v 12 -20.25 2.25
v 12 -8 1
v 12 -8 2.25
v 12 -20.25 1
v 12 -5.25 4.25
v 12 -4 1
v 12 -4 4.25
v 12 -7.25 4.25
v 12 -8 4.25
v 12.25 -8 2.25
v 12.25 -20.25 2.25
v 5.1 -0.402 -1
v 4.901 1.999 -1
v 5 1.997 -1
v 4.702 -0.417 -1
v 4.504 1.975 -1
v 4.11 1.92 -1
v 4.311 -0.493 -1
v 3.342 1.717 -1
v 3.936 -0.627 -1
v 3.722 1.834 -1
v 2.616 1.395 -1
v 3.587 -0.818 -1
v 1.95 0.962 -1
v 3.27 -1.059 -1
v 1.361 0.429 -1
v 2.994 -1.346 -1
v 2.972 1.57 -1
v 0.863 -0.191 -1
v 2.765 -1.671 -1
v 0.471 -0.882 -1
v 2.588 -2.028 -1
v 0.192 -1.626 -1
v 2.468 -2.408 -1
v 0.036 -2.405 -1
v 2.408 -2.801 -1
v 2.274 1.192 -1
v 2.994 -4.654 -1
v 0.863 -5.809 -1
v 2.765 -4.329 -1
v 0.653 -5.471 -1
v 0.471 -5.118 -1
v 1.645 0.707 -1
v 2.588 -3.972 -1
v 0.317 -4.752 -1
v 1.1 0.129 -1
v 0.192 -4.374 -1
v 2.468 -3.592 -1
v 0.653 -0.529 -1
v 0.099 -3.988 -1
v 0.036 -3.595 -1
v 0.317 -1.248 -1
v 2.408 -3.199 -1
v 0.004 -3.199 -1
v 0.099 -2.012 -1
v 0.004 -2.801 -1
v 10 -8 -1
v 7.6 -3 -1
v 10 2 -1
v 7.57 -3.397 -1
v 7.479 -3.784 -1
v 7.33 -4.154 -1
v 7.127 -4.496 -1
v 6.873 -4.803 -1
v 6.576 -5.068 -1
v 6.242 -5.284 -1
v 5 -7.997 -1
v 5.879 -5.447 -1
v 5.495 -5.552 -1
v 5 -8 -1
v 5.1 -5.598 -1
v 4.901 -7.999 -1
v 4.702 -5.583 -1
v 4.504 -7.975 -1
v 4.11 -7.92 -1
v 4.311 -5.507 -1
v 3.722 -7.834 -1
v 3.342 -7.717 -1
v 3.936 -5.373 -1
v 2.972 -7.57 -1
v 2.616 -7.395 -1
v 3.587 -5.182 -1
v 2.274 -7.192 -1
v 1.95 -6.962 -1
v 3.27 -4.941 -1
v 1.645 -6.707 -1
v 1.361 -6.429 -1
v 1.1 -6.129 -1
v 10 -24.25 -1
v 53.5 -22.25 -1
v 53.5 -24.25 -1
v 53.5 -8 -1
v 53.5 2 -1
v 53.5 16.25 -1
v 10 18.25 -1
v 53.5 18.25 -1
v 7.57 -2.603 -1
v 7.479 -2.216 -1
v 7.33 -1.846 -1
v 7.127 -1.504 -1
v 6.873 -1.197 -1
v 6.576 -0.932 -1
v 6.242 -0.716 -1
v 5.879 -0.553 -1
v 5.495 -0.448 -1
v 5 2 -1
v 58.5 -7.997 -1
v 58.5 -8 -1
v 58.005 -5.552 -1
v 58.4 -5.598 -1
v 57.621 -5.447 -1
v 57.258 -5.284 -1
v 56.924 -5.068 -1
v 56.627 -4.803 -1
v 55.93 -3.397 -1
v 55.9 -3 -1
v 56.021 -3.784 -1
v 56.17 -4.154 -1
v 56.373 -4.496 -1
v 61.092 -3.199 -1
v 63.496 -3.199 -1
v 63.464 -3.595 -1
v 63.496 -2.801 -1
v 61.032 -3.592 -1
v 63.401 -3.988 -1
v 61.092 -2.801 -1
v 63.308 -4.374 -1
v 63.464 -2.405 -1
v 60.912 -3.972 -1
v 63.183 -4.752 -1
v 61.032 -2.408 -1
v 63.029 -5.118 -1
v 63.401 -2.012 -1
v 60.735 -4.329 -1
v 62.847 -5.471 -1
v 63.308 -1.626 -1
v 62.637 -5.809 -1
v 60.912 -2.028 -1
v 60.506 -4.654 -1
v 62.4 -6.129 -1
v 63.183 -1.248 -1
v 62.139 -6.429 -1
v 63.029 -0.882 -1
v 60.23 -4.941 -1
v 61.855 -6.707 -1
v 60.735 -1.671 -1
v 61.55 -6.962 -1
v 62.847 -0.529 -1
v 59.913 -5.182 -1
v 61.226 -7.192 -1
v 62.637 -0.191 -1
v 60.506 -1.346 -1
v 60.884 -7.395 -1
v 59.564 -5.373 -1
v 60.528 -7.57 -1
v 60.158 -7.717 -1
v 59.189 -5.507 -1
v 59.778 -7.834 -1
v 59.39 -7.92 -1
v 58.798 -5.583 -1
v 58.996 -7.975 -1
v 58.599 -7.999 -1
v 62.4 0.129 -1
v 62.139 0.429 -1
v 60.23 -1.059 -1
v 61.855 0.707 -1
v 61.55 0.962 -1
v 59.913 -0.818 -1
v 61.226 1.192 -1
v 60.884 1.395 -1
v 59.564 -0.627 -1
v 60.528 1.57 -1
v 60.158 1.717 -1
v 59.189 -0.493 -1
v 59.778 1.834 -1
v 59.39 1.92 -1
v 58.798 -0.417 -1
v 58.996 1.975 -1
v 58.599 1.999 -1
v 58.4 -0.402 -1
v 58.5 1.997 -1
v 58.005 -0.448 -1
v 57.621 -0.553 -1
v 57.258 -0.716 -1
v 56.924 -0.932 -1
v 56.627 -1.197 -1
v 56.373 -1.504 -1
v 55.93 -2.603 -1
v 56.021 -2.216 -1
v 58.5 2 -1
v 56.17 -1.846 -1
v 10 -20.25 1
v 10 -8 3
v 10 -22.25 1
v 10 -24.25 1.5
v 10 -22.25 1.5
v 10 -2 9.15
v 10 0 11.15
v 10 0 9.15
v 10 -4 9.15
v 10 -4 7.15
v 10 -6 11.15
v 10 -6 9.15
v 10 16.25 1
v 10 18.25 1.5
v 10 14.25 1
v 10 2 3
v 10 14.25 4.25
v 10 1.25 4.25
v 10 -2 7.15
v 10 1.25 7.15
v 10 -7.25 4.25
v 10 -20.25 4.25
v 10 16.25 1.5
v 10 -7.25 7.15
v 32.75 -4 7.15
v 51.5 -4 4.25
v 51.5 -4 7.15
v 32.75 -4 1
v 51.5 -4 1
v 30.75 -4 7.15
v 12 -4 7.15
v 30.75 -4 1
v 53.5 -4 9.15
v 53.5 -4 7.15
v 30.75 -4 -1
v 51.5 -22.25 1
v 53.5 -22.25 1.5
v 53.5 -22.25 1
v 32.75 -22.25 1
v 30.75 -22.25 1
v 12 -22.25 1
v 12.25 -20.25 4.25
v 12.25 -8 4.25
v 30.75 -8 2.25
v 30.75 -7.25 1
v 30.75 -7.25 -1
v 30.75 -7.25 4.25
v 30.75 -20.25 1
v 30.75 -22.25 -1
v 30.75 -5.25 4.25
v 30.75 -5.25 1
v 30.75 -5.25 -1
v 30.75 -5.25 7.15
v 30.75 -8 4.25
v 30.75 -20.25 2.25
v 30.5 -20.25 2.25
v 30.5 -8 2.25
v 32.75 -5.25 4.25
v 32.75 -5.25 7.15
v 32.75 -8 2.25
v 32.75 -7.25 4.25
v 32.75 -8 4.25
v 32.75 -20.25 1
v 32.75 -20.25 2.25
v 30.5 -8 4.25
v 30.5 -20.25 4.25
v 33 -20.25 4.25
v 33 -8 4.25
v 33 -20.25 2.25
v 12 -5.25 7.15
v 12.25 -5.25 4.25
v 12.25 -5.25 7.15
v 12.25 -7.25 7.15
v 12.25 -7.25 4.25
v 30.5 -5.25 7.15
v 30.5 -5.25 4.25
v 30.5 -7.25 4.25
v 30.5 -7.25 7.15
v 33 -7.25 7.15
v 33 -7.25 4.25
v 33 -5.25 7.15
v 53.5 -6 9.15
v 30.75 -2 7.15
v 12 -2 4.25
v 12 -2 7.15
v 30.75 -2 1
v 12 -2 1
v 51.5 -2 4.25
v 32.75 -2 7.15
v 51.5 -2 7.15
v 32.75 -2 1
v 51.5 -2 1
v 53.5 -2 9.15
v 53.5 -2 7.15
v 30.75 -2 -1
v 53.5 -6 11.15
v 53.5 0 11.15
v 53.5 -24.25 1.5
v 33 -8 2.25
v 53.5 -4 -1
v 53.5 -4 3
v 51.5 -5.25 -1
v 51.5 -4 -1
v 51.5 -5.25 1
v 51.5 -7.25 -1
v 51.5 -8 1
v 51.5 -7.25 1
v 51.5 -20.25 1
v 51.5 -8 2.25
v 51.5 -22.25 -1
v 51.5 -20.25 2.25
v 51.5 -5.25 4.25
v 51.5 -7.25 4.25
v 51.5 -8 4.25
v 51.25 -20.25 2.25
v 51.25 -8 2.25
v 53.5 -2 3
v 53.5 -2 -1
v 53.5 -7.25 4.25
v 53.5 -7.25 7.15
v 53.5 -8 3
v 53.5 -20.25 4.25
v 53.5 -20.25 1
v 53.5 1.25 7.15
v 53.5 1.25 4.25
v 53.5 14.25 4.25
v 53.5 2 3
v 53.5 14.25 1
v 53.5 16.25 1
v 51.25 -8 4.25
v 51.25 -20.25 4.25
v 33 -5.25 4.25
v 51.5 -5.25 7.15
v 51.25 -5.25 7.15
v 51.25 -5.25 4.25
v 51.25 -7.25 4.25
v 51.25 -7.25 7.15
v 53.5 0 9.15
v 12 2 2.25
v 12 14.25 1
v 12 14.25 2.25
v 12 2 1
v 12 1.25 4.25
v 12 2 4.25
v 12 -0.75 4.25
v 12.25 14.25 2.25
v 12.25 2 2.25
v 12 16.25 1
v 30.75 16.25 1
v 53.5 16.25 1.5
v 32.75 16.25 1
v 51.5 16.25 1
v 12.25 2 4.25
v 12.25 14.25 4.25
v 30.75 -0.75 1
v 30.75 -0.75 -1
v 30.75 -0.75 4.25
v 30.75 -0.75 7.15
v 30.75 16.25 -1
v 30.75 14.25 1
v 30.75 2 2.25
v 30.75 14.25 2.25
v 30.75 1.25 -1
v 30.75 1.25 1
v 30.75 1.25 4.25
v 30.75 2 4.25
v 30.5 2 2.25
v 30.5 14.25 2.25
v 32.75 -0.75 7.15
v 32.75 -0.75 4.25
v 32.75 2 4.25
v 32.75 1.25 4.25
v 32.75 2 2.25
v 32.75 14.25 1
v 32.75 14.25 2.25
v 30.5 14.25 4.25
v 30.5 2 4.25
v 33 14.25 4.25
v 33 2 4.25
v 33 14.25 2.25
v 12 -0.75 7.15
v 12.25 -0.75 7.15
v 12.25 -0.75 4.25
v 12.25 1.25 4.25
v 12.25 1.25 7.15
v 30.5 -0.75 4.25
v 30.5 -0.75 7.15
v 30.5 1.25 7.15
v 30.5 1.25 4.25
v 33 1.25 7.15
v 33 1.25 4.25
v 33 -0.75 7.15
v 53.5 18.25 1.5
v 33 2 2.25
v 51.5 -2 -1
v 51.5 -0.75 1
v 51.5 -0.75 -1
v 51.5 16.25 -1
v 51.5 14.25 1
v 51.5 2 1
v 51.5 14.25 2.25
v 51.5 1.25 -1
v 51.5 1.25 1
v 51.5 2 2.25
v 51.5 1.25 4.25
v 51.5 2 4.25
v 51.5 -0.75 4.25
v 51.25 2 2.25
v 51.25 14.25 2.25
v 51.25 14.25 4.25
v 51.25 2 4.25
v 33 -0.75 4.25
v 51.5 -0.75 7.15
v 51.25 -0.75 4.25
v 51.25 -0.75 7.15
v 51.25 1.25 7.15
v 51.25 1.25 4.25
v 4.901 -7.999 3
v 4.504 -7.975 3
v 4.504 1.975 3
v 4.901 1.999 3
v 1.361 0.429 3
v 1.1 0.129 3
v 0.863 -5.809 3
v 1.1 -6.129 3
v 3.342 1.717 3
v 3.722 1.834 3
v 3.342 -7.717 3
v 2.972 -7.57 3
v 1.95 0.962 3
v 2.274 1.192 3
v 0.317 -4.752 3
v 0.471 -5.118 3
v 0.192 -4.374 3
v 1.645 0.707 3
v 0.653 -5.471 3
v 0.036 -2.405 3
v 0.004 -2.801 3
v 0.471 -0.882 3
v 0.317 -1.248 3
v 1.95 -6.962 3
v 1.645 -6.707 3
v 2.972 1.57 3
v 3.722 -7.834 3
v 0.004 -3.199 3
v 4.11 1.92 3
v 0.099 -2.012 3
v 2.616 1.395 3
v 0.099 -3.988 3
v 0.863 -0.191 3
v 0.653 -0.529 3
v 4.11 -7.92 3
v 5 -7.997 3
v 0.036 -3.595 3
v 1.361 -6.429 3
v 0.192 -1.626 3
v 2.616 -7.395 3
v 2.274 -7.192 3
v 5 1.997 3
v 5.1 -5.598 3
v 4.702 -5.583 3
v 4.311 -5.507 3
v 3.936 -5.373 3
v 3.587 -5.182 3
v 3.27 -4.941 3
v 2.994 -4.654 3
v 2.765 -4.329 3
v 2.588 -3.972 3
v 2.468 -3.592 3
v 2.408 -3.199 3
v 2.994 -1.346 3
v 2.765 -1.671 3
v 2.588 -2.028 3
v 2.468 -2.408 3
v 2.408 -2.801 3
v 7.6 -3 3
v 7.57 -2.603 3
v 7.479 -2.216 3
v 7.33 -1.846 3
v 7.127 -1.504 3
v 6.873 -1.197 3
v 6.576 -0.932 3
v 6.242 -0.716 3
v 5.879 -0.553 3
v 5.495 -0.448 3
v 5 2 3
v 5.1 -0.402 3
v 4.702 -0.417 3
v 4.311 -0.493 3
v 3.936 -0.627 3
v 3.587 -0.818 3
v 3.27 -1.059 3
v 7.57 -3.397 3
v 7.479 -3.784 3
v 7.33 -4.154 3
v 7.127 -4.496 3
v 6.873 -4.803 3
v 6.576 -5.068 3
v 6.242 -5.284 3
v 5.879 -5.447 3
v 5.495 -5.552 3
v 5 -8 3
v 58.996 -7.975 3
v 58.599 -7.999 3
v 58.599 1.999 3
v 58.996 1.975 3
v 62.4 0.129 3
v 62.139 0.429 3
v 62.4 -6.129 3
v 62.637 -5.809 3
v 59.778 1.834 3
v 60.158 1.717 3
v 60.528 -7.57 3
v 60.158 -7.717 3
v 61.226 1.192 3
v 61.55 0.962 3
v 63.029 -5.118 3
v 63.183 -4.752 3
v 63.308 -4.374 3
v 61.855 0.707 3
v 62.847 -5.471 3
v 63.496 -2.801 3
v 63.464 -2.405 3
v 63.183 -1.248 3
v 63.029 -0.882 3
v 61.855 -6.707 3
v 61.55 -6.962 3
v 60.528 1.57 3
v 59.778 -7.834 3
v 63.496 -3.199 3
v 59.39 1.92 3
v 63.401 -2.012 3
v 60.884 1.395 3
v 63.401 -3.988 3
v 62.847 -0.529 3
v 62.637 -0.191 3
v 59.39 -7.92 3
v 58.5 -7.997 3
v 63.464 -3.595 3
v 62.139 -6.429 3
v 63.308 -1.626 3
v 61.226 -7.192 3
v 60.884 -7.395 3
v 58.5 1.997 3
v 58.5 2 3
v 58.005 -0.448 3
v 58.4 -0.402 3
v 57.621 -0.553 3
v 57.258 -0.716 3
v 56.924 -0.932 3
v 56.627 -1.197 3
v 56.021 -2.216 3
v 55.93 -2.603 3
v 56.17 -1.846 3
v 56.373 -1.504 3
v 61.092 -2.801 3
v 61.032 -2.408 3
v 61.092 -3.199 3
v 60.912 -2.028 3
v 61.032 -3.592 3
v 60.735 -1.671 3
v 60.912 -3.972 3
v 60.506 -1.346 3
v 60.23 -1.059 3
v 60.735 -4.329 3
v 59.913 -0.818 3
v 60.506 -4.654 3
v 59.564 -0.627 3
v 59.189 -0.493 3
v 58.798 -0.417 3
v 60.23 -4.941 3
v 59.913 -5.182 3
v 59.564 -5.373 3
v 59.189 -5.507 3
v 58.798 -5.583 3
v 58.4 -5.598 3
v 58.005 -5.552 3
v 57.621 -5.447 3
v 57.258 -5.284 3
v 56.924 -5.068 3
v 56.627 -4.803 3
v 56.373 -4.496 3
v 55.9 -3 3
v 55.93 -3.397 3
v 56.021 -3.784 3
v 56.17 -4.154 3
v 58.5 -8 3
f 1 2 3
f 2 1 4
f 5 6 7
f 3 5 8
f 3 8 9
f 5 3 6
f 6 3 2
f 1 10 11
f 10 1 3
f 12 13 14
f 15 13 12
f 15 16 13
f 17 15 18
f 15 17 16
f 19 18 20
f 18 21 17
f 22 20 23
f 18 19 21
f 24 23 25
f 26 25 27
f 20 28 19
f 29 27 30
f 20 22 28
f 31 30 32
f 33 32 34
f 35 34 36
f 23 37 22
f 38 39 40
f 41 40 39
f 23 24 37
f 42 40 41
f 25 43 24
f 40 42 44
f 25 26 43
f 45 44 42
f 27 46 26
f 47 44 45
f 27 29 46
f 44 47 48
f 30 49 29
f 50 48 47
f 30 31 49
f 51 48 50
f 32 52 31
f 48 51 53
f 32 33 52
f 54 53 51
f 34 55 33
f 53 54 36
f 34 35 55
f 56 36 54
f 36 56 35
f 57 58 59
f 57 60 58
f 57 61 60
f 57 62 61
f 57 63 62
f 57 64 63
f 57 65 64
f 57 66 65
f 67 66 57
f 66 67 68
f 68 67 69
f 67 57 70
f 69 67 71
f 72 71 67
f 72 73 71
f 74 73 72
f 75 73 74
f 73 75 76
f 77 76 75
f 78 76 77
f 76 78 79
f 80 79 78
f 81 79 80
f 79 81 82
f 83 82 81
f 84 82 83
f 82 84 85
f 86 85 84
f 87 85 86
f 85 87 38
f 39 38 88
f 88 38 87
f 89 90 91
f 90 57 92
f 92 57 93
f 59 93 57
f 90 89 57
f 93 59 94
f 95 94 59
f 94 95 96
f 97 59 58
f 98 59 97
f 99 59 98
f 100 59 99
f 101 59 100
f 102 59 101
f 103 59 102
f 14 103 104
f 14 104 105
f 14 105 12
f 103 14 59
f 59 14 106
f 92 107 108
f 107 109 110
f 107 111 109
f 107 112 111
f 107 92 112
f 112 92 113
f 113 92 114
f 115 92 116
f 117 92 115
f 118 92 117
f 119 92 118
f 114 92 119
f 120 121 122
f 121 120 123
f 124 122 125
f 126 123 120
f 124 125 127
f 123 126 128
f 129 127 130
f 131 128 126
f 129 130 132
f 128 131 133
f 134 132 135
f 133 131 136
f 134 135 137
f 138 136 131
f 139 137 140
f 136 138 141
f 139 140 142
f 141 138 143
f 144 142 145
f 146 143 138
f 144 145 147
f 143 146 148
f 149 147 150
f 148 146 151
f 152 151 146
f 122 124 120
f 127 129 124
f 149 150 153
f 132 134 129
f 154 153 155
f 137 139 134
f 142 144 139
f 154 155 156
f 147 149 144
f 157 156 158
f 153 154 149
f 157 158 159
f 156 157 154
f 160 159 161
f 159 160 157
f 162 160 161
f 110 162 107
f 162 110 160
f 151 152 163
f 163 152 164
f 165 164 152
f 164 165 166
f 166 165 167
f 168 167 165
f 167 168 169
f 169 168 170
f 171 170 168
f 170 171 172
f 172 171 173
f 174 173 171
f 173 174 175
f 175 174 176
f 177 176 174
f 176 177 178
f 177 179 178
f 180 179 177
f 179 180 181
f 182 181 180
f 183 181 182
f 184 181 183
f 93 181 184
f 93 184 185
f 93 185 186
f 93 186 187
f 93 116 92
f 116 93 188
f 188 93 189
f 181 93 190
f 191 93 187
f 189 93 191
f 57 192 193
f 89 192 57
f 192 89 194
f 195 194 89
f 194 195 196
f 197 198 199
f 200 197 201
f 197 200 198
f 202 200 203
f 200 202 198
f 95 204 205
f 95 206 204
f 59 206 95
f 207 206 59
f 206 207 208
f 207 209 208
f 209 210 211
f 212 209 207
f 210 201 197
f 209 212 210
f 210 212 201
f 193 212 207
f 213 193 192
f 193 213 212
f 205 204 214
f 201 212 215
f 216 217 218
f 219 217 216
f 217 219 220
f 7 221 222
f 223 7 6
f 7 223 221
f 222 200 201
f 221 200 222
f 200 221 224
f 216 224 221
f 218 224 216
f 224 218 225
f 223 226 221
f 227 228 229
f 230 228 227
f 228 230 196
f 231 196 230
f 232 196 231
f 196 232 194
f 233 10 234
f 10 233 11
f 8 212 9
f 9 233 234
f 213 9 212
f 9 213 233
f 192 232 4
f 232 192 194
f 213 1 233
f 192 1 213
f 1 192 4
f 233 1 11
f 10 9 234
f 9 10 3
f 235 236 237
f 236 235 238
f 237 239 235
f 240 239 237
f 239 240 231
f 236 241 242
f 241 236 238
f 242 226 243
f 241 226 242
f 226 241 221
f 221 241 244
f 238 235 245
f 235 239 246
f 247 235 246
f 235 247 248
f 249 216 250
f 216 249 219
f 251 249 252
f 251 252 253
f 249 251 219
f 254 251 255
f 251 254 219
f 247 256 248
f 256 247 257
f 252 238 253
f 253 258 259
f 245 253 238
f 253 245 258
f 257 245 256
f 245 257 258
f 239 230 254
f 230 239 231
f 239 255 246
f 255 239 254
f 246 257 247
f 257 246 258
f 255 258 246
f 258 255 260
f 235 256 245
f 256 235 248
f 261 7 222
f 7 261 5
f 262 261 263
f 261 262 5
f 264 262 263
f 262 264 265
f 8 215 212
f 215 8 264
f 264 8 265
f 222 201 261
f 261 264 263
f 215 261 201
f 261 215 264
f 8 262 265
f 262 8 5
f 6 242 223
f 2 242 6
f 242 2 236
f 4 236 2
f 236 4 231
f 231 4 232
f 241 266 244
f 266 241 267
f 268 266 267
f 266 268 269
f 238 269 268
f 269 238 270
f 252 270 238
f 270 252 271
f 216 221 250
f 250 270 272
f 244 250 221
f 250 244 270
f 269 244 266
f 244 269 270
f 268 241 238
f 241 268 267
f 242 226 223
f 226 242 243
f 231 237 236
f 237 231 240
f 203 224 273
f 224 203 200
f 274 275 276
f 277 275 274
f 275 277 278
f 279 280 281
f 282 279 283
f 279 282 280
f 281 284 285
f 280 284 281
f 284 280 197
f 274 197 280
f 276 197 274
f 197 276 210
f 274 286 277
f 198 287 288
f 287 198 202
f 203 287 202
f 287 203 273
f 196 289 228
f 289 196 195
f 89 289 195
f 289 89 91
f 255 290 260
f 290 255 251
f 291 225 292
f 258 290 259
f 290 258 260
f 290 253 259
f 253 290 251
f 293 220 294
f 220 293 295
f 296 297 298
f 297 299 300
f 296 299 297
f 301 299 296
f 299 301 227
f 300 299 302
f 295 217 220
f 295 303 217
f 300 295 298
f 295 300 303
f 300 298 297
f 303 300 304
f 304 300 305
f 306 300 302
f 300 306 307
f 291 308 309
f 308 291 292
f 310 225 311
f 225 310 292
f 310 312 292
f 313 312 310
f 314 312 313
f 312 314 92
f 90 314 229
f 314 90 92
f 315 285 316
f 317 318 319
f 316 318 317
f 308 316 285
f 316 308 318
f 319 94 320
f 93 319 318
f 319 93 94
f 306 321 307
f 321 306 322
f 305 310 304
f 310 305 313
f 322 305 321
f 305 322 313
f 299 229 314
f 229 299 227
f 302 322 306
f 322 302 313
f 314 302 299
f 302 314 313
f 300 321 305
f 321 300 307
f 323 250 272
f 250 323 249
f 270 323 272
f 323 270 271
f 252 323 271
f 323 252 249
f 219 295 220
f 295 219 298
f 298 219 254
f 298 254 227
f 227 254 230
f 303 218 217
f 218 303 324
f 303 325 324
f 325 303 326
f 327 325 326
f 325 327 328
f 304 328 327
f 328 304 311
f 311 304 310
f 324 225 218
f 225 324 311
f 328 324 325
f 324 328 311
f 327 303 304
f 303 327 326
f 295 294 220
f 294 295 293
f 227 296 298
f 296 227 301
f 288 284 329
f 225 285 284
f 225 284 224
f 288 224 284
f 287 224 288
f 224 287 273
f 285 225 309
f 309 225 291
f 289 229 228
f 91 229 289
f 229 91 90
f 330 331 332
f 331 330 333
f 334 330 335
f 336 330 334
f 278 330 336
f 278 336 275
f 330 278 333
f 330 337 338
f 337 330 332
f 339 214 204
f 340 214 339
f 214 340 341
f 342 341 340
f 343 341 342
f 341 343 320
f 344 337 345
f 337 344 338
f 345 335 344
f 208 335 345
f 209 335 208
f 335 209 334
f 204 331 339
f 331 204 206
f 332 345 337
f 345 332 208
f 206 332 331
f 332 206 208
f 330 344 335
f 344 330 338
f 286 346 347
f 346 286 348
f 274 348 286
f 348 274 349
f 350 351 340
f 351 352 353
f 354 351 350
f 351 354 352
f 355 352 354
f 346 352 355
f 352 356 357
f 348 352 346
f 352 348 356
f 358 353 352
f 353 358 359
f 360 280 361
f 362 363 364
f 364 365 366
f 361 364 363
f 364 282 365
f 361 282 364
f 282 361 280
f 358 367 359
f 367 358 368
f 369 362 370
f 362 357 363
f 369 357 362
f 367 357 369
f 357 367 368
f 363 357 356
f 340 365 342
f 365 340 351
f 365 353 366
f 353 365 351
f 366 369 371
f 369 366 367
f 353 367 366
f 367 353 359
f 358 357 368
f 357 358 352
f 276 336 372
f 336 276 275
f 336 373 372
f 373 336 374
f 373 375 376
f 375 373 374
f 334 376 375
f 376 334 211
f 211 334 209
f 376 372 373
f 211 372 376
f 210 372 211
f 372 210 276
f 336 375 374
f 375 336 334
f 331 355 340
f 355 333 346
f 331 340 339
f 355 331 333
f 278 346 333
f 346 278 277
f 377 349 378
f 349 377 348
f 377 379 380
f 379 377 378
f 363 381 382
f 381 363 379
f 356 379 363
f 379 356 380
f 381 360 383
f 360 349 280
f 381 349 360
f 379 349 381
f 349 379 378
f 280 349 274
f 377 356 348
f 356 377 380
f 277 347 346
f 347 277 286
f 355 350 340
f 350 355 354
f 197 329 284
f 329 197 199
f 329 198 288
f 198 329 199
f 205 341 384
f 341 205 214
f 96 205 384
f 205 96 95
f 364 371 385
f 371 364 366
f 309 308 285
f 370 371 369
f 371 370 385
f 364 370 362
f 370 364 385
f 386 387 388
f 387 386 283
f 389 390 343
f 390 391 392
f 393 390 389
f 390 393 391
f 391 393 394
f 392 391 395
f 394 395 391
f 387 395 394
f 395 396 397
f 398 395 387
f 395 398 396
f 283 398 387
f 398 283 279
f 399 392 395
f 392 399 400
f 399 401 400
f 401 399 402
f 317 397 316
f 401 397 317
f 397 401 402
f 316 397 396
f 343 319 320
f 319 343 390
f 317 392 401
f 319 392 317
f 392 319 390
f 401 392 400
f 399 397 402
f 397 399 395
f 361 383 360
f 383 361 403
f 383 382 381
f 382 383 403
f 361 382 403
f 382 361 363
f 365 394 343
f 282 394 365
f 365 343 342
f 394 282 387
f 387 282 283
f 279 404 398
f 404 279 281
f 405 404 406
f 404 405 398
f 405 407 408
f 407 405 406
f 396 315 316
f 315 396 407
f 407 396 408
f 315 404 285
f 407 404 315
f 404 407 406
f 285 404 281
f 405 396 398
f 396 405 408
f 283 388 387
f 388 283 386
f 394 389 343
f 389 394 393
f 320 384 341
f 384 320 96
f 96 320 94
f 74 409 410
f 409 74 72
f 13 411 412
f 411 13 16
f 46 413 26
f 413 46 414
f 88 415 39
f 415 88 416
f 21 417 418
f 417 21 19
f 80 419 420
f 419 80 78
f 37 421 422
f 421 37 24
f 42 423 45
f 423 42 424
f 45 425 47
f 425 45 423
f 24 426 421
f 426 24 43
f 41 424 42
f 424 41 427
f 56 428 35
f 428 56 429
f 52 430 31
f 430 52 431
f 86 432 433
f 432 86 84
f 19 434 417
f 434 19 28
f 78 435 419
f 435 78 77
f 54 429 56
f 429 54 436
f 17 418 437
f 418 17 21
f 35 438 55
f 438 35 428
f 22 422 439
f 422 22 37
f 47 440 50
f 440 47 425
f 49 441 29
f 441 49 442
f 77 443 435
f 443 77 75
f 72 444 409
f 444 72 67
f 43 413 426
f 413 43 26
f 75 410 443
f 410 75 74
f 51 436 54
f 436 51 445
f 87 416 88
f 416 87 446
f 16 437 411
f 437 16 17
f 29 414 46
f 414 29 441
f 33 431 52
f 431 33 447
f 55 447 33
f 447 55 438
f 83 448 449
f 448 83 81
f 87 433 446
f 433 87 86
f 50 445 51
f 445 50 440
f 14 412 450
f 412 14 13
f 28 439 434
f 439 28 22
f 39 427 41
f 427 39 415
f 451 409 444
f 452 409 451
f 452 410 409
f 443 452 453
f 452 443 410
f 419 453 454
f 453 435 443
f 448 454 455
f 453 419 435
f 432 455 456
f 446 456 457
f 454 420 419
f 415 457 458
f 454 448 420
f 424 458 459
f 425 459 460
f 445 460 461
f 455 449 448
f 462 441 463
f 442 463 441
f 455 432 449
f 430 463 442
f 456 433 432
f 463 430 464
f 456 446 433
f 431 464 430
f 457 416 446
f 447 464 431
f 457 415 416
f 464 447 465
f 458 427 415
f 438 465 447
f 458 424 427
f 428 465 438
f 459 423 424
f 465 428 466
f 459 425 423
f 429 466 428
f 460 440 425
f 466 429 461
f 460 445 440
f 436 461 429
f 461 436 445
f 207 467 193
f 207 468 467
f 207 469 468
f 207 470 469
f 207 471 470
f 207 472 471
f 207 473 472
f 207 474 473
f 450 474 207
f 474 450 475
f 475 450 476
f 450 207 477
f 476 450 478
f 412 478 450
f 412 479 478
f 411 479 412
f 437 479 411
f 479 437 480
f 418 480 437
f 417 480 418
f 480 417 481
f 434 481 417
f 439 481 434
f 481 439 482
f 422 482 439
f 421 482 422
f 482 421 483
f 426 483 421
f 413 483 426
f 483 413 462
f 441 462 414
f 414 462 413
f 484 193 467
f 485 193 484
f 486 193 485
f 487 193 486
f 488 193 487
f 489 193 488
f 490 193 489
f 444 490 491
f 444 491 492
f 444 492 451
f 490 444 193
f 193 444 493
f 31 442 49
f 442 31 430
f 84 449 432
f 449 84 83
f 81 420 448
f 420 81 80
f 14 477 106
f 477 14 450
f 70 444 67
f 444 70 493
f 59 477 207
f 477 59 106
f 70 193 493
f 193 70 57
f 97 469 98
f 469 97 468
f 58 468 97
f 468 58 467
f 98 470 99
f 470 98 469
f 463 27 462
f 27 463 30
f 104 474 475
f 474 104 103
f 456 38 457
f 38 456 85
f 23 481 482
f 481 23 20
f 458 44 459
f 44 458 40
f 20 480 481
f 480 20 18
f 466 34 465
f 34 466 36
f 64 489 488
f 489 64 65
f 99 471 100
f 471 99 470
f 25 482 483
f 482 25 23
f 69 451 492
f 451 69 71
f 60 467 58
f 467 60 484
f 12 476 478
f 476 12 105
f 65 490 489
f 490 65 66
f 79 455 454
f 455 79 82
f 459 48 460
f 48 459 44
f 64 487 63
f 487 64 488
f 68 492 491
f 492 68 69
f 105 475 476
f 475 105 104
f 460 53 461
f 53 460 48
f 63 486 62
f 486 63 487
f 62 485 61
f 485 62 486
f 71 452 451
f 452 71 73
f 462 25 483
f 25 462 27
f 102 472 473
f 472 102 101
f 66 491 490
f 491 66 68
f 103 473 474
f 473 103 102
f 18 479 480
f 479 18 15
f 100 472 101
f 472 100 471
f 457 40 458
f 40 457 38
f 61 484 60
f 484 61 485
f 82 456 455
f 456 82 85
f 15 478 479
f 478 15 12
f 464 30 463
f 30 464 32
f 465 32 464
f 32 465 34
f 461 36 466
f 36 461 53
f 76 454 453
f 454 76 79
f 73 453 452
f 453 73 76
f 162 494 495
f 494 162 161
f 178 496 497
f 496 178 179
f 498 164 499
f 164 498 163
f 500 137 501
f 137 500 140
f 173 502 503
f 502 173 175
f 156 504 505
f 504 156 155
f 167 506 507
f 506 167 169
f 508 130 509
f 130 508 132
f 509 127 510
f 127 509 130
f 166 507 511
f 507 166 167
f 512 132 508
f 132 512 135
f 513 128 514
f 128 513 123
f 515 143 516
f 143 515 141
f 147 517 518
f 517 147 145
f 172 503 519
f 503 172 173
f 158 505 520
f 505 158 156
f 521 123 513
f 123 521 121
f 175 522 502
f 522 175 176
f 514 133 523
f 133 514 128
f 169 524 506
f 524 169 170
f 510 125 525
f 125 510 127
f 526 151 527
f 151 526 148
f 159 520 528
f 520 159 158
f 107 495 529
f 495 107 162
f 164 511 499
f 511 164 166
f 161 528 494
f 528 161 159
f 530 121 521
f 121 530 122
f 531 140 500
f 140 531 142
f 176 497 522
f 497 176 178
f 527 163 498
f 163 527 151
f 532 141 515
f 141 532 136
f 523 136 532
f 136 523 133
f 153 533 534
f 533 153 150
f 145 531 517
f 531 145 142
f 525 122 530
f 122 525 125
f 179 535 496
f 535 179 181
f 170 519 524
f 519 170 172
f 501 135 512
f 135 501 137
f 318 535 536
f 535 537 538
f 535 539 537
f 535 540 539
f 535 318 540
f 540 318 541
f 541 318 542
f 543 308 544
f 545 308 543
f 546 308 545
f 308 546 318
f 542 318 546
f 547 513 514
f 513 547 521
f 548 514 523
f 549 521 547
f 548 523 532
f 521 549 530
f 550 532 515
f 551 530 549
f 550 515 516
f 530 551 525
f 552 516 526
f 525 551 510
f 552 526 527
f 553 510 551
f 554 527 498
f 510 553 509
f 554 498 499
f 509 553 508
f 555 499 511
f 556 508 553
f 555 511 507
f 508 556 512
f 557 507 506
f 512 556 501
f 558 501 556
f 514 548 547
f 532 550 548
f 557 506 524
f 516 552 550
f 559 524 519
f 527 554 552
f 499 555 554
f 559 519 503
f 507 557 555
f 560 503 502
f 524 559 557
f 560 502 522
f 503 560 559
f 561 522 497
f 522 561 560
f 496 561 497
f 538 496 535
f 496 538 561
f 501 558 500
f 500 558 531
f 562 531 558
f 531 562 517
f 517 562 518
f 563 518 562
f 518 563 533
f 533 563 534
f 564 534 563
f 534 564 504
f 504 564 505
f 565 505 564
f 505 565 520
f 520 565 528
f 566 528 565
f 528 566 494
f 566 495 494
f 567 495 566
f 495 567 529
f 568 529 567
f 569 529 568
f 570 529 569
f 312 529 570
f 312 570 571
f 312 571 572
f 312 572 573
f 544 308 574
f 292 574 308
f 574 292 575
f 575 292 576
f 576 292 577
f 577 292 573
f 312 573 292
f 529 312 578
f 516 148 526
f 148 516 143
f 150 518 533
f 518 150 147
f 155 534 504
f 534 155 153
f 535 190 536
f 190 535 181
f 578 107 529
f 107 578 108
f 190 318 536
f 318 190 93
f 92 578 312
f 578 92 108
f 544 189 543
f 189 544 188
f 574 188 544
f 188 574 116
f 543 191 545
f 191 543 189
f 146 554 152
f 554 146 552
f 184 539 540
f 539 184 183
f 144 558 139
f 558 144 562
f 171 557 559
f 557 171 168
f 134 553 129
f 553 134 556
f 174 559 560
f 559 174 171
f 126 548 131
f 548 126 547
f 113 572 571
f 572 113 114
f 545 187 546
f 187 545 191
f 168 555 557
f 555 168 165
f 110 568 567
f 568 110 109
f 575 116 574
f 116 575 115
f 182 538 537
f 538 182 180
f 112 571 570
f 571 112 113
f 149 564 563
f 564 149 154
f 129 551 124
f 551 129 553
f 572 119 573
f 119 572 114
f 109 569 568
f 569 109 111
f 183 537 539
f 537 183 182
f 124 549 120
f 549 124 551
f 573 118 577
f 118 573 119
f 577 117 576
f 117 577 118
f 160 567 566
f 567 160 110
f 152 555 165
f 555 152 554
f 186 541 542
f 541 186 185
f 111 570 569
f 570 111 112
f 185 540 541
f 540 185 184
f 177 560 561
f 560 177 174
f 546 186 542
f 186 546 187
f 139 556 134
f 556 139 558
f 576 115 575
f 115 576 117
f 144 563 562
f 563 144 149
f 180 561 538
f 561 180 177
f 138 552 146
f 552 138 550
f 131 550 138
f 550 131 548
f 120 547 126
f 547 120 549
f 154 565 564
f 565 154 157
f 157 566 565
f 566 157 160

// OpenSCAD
// ////////////////////////////////////////////////
//
// WAGO 221 mount
//
// Creates a single row or double row set of 221 blocks
// with mounting tabs/ears at either end.
//
// Created - 2017/01/01 by Joo Chung
//
// ////////////////////////////////////////////////

// ////////////////////////////////////////////////
// vector of blocks. each element specifies the number of conductors for that block
// EDIT THIS
blocks = [3,3]; // a single 5 conductor blocks 
// blocks = [5, 3, 2]; // a set of 5 conductor, 3 conductor, 2 conductor blocks
// blocks = [5, 5, 5]; // a set of three 5 conductor blocks
// blocks = [2]; // a single 2 conductor block
// blocks = [3]; // a single 3 conductor block


// ////////////////////////////////////////////////
// Mirror the mount, stand it up, and put tabs on bottom.
// 0 - no mirror, 1 - mirror, rotate so its standing up, and reposition tabs
// 2 - mirror, rotate so that they are laying flat, and reposition tabs.
// EDIT THIS
mirror = 2;

// ////////////////////////////////////////////////
// Tabs - include or exclude mounting tabs
// EDIT THIS: 0 - no tabs, 1 - tabs
tabs = 1;
// EDIT THIS: radius of hole in tab
tabradius = 2.6;
// EDIT THIS: thickness of tab
tabheight = 4;
// EDIT THIS: Set width and length of the tab. (tab is basically a square)
tabwidth = 10;



// ////////////////////////////////////////////////
// Block dimensions in mm -- DO NOT EDIT
conwidth = 5.6; // width of a single conductor
// DO NOT EDIT
border = 1.75; // block transparent plastic border
// DO NOT EDIT
blockdepth = 18.25;
// DO NOT EDIT
fudge = 0.2;

// ////////////////////////////////////////////////
// OpenSCAD special variables -- DO NOT EDIT
$fa = 1;
// DO NOT EDIT
$fs = 0.4;

// ////////////////////////////////////////////////
// Functions
function bw(x) = conwidth*x+border+fudge; // block width
function mw(i, n) = ( i==0 ? bw(blocks[i]) + 2 + mw(i+1, n) : (i < n ? bw(blocks[i]) + 2 + mw(i+1, n) : 0)); // mount width (index, max index)


// ////////////////////////////////////////////////
// Modules
module tab(width, hole, thickness) {
    difference() {
        union () {
            cylinder(thickness,width/2,width/2, true);
            translate([width/4,0,0]) cube([width/2,width,thickness], true);
        }
    cylinder(width,hole,hole, true);
    }
}

module shoulder (depth) {
    difference () {
        union () {
            cube([2, blockdepth, 3.25], false);
            translate([0,0,3.25]) cube([2.25, blockdepth, 2], false);
        }
        translate([0,0,2]) cube([2.25,2,3.25], false);
        translate([2,blockdepth-4,2]) cube([0.25,4,3.25], false);
    }
}


module backshoulder (height) {
    difference() {
        union() {  
            translate([0, 2, 0]) cube ([2, 1.25, 10.15]);
            cube ([2.25, 2, 10.15]);
        }
        translate([0,0,10.15-2]) cube([2.25,3.25,2]);
        translate([2,0,2]) cube([1.25,3.25,3.25]);
    }
}



// WAGO 221 block
module block (nconn) {
    blockwidth = bw(nconn);

    // base
    translate([2,2,0]) cube([blockwidth, blockdepth, 2], false);
    
    // back headboard
    translate([0,blockdepth+2,0]) cube([blockwidth+4, 2, 10.15], false);

    // back lip
    translate([0,blockdepth,10.15]) cube([blockwidth+4, 4, 2], false);
    
    // front lip
    translate([0,0,0]) cube([blockwidth+4, 2, 2.5], false);

    // left shoulder and right shoulders
    translate([0,2,0]) shoulder();
    translate([blockwidth+4,2,0]) mirror() shoulder(); 
    
    // back left and shoulder
    translate([0, blockdepth-1.25, 0]) backshoulder(); 
    translate([blockwidth+4, blockdepth -1.25, 0]) mirror() backshoulder();
    
}



// ////////////////////////////////////////////////
// MAIN BODY

mountwidth=mw(0, len(blocks));
if (mirror==0) { // No mirror. Single row of blocks
    // create array of blocks
    for (i=[0:len(blocks)-1]) {
        offset = (i==0) ? tabwidth : tabwidth + mw(0, i);
        translate([offset, 0, 0]) block(blocks[i]);
    }
    
    // left and right tabs
    if (tabs==1) {
        translate([tabwidth/2,(blockdepth+4)/2,tabheight/2]) tab (tabwidth, tabradius, tabheight);
        translate([mountwidth+2+tabwidth+tabwidth/2,(blockdepth+4)/2,tabheight/2]) mirror() tab (tabwidth, tabradius, tabheight);
    }
} else if (mirror==1) { // Mirrored. two rows of blocks, back to back.
    // Row #1. Stand up on headboard.
    rotate([-90,0,0]) for (i=[0:len(blocks)-1]) {
        offset = (i==0) ? tabwidth : tabwidth + mw(0, i);
        translate([offset, 0, -1]) block(blocks[i]);
    }
    
    // Row #2. Opposite rotation. Stand up on headbord
    rotate([90,0,0]) mirror ([0, 1, 0]) for (i=[0:len(blocks)-1]) {
        offset = (i==0) ? tabwidth : tabwidth + mw(0, i);
        translate([offset, 0, -1]) block(blocks[i]);
    }   
    
    // left and right tabs
    if (tabs==1) {
        translate([tabwidth/2,0,-blockdepth-tabheight/2]) tab (tabwidth, tabradius, tabheight);
        translate([mountwidth+2+tabwidth+tabwidth/2,0,-blockdepth-tabheight/2]) mirror() tab (tabwidth, tabradius, tabheight);
    }
} else if (mirror==2) {
    // Row #1. 
    for (i=[0:len(blocks)-1]) {
        offset = (i==0) ? tabwidth : tabwidth + mw(0, i);
        translate([offset, -blockdepth-6, -1]) block(blocks[i]);
    }
    
    // Row #2. Flip
    mirror ([0, 1, 0]) for (i=[0:len(blocks)-1]) {
        offset = (i==0) ? tabwidth : tabwidth + mw(0, i);
        translate([offset, -blockdepth, -1]) block(blocks[i]);
    }   
    
    // left and right tabs
    if (tabs==1) {
        translate([tabwidth/2,-3,(tabheight-2)/2]) tab (tabwidth, tabradius, tabheight);
        translate([mountwidth+2+tabwidth+tabwidth/2,-3,(tabheight-2)/2]) mirror() tab (tabwidth, tabradius, tabheight);
    }
}
